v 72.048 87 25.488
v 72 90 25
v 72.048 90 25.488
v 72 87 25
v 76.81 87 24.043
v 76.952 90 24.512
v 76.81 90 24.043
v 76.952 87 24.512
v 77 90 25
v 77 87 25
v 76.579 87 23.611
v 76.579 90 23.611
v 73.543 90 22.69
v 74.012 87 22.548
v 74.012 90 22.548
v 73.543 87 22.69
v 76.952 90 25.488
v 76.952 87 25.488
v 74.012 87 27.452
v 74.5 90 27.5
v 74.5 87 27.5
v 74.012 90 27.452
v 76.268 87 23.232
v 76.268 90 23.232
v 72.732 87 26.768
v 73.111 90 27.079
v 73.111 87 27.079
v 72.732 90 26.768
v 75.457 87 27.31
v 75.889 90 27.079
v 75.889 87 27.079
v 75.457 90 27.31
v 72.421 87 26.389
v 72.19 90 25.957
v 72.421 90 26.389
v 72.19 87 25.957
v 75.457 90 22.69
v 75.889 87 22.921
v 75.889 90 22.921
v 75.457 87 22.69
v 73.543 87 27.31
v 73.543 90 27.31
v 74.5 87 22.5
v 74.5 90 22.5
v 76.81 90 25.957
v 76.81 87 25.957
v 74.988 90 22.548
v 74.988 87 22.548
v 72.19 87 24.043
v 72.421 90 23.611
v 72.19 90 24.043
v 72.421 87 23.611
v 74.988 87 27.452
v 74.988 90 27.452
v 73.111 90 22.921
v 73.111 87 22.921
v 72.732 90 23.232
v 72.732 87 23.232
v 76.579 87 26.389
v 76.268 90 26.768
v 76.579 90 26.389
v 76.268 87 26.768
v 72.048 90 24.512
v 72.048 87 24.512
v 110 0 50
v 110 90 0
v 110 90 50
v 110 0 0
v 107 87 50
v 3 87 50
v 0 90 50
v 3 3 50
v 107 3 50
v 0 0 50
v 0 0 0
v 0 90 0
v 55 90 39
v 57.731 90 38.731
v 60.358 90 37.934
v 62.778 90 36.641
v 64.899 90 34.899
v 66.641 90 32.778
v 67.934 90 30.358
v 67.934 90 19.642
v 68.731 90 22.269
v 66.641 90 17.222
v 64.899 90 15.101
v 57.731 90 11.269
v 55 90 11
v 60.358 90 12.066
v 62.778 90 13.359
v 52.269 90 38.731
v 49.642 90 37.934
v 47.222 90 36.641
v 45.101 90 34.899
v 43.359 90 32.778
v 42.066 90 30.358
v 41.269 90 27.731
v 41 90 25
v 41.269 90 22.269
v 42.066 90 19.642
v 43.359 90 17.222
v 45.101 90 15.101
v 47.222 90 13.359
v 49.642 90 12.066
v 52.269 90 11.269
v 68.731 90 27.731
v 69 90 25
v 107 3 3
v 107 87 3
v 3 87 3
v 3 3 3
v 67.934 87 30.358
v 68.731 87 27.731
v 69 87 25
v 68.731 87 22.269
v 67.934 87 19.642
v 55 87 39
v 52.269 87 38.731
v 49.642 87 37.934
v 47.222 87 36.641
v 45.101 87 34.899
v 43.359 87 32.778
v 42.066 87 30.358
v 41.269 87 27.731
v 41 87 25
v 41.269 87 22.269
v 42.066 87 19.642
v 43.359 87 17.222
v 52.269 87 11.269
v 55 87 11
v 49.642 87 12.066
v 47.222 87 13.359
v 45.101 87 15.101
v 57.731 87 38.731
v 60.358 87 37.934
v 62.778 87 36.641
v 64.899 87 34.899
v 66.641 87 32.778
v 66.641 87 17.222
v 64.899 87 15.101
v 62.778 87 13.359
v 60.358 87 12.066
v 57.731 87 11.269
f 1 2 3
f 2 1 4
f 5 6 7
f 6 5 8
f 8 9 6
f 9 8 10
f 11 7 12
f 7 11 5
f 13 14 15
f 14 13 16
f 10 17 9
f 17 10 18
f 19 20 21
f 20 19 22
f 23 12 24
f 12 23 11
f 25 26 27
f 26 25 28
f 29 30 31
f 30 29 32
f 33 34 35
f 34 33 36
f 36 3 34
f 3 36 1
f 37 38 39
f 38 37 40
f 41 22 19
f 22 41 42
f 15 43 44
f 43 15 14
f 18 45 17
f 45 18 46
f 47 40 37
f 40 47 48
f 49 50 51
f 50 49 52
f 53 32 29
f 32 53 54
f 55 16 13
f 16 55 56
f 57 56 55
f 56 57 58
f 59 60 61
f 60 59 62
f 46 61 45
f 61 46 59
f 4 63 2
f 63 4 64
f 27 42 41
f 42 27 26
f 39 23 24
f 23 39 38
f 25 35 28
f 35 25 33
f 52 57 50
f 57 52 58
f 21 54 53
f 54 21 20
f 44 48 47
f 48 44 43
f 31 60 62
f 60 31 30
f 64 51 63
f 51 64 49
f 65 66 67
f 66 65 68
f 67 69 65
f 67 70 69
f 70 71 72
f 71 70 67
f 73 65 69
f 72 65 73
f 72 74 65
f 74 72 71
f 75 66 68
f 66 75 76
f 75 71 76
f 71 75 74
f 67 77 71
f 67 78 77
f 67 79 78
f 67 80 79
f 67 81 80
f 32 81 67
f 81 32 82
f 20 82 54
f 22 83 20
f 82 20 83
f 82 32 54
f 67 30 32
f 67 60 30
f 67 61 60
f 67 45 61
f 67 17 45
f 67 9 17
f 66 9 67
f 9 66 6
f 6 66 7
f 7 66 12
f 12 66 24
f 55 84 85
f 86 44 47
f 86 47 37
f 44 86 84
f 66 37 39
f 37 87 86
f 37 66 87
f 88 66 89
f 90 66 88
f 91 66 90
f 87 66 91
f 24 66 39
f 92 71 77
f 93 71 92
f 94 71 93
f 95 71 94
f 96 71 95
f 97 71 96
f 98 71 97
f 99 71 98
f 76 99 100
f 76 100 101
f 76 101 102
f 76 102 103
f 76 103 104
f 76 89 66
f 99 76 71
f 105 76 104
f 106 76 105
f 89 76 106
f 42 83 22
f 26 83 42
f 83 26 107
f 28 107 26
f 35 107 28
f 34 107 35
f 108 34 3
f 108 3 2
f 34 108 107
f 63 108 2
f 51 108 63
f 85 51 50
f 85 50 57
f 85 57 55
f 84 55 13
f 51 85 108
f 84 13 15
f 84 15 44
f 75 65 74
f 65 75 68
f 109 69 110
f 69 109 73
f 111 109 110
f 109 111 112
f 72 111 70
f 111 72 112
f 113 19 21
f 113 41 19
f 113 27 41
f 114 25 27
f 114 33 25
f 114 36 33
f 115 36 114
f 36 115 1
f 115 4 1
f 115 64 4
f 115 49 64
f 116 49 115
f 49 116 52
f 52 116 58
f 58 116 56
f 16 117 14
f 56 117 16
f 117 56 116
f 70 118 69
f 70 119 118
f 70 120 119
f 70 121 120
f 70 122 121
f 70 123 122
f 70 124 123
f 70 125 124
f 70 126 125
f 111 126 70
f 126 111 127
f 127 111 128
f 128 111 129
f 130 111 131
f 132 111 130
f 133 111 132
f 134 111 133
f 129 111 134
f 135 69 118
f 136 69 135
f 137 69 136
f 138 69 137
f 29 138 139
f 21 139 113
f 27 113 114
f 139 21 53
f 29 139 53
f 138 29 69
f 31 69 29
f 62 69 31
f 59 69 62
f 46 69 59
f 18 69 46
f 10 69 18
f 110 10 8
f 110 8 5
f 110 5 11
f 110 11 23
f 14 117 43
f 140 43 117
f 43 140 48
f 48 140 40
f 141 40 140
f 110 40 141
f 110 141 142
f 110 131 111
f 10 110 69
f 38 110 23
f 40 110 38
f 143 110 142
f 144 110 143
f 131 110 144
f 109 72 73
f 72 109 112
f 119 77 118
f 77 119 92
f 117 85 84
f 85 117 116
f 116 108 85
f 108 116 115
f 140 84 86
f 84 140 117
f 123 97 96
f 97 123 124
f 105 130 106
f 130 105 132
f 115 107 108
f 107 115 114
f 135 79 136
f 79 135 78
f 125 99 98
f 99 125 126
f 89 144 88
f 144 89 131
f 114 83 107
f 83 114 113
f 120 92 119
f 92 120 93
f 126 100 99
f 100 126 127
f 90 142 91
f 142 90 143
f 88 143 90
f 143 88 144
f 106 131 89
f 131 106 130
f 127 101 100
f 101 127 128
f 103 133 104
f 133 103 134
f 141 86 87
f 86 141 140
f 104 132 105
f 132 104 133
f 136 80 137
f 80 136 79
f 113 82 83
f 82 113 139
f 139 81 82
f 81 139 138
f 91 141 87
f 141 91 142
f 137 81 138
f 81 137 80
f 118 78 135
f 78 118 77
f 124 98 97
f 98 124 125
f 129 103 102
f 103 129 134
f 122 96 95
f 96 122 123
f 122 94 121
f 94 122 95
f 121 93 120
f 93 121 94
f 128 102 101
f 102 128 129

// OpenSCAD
$fn = 32;

// ----------------------------------------------------------------------
// Vent box: roundvent enclosure
// ----------------------------------------------------------------------

// --- parameters (mm) ---
box_l = 110;              // box length, X
box_w = 90;               // box width, Y
box_h = 50;               // box height, Z
wall_t = 3;               // shell wall thickness
vent_d = 28;              // central vent diameter
ring_d = 5;               // ring hole diameter
n_ring = 6;               // holes in the ring
ring_r = 19.5;            // ring radius

ring_step = 360 / n_ring;  // ring hole angular step

difference() {
  cube([box_l, box_w, box_h]);
  translate([wall_t, wall_t, wall_t])
    cube([box_l - 2 * wall_t, box_w - 2 * wall_t, box_h]);
  translate([box_l / 2, box_w - wall_t - 1, box_h / 2])
    rotate([-90, 0, 0]) cylinder(h = wall_t + 2, d = vent_d);
  for (i = [0 : n_ring - 1])
    translate([box_l / 2, box_w - wall_t - 1, box_h / 2])
      rotate([0, 0, i * ring_step])
        translate([ring_r, 0, 0]) rotate([-90, 0, 0])
          cylinder(h = wall_t + 2, d = ring_d);
}
